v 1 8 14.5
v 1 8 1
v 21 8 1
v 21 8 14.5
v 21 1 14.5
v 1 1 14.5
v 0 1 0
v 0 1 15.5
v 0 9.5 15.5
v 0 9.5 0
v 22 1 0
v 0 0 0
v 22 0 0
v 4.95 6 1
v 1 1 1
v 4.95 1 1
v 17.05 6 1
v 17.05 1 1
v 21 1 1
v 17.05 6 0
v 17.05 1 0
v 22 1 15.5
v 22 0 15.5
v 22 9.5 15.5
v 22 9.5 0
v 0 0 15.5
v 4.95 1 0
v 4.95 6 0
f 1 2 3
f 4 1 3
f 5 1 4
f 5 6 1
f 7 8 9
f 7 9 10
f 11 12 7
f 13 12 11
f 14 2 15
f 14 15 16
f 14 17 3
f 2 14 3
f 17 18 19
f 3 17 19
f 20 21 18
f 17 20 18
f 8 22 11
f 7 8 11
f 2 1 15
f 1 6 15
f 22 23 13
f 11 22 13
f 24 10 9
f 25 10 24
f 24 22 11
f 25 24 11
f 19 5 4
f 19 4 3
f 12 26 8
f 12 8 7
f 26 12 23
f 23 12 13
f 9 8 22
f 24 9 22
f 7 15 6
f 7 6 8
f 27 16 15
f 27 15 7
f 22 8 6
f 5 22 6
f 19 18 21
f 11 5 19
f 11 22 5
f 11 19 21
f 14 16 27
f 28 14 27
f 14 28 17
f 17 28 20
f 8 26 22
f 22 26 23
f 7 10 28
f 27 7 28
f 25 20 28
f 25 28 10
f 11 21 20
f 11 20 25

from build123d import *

# Parameters (mm, degrees)
SKETCH_1_W      = 22
SKETCH_1_H      = 15.5
EXTRUDE_1_DEPTH = 1
EXTRUDE_2_DEPTH = 5
SKETCH_3_W      = 22
SKETCH_3_H      = 15.5
SKETCH_3_W_2    = 20
SKETCH_3_H_2    = 13.5
EXTRUDE_3_DEPTH = 2
SKETCH_4_W      = 22
SKETCH_4_H      = 15.5
EXTRUDE_4_DEPTH = 1.5


with BuildPart() as part:
    # 草图1 → 凸台-拉伸1 (new body)
    with BuildSketch(Plane(origin=(0, 0, 0), x_dir=(1, 0, 0), z_dir=(0, 1, 0))):
        with Locations((11, -7.75)):
            Rectangle(SKETCH_1_W, SKETCH_1_H)
    extrude(amount=EXTRUDE_1_DEPTH)

    # 草图2 → 凸台-拉伸2 (add)
    with BuildSketch(Plane(origin=(0, 1, 0), x_dir=(1, 0, 0), z_dir=(0, 1, 0))):
        Polygon((4.95, -1), (4.95, 0), (0, 0), (0, -1.5), (0, -15.5), (1.5, -15.5), (11, -15.5), (11, -14.5), (1, -14.5), (1, -1), align=None)
        Polygon((22, 0), (17.05, 0), (17.05, -1), (21, -1), (21, -14.5), (11, -14.5), (11, -15.5), (20.5, -15.5), (22, -15.5), (22, -1.5), align=None)
    extrude(amount=EXTRUDE_2_DEPTH)

    # 草图3 → 凸台-拉伸3 (add)
    with BuildSketch(Plane(origin=(0, 6, 0), x_dir=(1, 0, 0), z_dir=(0, 1, 0))):
        with Locations((11, -7.75)):
            Rectangle(SKETCH_3_W, SKETCH_3_H)
        with Locations((11, -7.75)):
            Rectangle(SKETCH_3_W_2, SKETCH_3_H_2, mode=Mode.SUBTRACT)
    extrude(amount=EXTRUDE_3_DEPTH)

    # 草图4 → 凸台-拉伸4 (add)
    with BuildSketch(Plane(origin=(0, 8, 0), x_dir=(1, 0, 0), z_dir=(0, 1, 0))):
        with Locations((11, -7.75)):
            Rectangle(SKETCH_4_W, SKETCH_4_H)
    extrude(amount=EXTRUDE_4_DEPTH)


with BuildPart() as body_2:
    # Split Bodies 1: the piece on the far side of the plane
    add(part.part)
    split(bisect_by=Plane(origin=(0, 1, 0), x_dir=(0, 0, -1), z_dir=(0, -1, 0)), keep=Keep.BOTTOM)


with BuildPart() as part_1:
    add(part.part)

    # Split Bodies 1
    split(bisect_by=Plane(origin=(0, 1, 0), x_dir=(0, 0, -1), z_dir=(0, -1, 0)), keep=Keep.TOP)


solid = Compound([body_2.part, part_1.part])
